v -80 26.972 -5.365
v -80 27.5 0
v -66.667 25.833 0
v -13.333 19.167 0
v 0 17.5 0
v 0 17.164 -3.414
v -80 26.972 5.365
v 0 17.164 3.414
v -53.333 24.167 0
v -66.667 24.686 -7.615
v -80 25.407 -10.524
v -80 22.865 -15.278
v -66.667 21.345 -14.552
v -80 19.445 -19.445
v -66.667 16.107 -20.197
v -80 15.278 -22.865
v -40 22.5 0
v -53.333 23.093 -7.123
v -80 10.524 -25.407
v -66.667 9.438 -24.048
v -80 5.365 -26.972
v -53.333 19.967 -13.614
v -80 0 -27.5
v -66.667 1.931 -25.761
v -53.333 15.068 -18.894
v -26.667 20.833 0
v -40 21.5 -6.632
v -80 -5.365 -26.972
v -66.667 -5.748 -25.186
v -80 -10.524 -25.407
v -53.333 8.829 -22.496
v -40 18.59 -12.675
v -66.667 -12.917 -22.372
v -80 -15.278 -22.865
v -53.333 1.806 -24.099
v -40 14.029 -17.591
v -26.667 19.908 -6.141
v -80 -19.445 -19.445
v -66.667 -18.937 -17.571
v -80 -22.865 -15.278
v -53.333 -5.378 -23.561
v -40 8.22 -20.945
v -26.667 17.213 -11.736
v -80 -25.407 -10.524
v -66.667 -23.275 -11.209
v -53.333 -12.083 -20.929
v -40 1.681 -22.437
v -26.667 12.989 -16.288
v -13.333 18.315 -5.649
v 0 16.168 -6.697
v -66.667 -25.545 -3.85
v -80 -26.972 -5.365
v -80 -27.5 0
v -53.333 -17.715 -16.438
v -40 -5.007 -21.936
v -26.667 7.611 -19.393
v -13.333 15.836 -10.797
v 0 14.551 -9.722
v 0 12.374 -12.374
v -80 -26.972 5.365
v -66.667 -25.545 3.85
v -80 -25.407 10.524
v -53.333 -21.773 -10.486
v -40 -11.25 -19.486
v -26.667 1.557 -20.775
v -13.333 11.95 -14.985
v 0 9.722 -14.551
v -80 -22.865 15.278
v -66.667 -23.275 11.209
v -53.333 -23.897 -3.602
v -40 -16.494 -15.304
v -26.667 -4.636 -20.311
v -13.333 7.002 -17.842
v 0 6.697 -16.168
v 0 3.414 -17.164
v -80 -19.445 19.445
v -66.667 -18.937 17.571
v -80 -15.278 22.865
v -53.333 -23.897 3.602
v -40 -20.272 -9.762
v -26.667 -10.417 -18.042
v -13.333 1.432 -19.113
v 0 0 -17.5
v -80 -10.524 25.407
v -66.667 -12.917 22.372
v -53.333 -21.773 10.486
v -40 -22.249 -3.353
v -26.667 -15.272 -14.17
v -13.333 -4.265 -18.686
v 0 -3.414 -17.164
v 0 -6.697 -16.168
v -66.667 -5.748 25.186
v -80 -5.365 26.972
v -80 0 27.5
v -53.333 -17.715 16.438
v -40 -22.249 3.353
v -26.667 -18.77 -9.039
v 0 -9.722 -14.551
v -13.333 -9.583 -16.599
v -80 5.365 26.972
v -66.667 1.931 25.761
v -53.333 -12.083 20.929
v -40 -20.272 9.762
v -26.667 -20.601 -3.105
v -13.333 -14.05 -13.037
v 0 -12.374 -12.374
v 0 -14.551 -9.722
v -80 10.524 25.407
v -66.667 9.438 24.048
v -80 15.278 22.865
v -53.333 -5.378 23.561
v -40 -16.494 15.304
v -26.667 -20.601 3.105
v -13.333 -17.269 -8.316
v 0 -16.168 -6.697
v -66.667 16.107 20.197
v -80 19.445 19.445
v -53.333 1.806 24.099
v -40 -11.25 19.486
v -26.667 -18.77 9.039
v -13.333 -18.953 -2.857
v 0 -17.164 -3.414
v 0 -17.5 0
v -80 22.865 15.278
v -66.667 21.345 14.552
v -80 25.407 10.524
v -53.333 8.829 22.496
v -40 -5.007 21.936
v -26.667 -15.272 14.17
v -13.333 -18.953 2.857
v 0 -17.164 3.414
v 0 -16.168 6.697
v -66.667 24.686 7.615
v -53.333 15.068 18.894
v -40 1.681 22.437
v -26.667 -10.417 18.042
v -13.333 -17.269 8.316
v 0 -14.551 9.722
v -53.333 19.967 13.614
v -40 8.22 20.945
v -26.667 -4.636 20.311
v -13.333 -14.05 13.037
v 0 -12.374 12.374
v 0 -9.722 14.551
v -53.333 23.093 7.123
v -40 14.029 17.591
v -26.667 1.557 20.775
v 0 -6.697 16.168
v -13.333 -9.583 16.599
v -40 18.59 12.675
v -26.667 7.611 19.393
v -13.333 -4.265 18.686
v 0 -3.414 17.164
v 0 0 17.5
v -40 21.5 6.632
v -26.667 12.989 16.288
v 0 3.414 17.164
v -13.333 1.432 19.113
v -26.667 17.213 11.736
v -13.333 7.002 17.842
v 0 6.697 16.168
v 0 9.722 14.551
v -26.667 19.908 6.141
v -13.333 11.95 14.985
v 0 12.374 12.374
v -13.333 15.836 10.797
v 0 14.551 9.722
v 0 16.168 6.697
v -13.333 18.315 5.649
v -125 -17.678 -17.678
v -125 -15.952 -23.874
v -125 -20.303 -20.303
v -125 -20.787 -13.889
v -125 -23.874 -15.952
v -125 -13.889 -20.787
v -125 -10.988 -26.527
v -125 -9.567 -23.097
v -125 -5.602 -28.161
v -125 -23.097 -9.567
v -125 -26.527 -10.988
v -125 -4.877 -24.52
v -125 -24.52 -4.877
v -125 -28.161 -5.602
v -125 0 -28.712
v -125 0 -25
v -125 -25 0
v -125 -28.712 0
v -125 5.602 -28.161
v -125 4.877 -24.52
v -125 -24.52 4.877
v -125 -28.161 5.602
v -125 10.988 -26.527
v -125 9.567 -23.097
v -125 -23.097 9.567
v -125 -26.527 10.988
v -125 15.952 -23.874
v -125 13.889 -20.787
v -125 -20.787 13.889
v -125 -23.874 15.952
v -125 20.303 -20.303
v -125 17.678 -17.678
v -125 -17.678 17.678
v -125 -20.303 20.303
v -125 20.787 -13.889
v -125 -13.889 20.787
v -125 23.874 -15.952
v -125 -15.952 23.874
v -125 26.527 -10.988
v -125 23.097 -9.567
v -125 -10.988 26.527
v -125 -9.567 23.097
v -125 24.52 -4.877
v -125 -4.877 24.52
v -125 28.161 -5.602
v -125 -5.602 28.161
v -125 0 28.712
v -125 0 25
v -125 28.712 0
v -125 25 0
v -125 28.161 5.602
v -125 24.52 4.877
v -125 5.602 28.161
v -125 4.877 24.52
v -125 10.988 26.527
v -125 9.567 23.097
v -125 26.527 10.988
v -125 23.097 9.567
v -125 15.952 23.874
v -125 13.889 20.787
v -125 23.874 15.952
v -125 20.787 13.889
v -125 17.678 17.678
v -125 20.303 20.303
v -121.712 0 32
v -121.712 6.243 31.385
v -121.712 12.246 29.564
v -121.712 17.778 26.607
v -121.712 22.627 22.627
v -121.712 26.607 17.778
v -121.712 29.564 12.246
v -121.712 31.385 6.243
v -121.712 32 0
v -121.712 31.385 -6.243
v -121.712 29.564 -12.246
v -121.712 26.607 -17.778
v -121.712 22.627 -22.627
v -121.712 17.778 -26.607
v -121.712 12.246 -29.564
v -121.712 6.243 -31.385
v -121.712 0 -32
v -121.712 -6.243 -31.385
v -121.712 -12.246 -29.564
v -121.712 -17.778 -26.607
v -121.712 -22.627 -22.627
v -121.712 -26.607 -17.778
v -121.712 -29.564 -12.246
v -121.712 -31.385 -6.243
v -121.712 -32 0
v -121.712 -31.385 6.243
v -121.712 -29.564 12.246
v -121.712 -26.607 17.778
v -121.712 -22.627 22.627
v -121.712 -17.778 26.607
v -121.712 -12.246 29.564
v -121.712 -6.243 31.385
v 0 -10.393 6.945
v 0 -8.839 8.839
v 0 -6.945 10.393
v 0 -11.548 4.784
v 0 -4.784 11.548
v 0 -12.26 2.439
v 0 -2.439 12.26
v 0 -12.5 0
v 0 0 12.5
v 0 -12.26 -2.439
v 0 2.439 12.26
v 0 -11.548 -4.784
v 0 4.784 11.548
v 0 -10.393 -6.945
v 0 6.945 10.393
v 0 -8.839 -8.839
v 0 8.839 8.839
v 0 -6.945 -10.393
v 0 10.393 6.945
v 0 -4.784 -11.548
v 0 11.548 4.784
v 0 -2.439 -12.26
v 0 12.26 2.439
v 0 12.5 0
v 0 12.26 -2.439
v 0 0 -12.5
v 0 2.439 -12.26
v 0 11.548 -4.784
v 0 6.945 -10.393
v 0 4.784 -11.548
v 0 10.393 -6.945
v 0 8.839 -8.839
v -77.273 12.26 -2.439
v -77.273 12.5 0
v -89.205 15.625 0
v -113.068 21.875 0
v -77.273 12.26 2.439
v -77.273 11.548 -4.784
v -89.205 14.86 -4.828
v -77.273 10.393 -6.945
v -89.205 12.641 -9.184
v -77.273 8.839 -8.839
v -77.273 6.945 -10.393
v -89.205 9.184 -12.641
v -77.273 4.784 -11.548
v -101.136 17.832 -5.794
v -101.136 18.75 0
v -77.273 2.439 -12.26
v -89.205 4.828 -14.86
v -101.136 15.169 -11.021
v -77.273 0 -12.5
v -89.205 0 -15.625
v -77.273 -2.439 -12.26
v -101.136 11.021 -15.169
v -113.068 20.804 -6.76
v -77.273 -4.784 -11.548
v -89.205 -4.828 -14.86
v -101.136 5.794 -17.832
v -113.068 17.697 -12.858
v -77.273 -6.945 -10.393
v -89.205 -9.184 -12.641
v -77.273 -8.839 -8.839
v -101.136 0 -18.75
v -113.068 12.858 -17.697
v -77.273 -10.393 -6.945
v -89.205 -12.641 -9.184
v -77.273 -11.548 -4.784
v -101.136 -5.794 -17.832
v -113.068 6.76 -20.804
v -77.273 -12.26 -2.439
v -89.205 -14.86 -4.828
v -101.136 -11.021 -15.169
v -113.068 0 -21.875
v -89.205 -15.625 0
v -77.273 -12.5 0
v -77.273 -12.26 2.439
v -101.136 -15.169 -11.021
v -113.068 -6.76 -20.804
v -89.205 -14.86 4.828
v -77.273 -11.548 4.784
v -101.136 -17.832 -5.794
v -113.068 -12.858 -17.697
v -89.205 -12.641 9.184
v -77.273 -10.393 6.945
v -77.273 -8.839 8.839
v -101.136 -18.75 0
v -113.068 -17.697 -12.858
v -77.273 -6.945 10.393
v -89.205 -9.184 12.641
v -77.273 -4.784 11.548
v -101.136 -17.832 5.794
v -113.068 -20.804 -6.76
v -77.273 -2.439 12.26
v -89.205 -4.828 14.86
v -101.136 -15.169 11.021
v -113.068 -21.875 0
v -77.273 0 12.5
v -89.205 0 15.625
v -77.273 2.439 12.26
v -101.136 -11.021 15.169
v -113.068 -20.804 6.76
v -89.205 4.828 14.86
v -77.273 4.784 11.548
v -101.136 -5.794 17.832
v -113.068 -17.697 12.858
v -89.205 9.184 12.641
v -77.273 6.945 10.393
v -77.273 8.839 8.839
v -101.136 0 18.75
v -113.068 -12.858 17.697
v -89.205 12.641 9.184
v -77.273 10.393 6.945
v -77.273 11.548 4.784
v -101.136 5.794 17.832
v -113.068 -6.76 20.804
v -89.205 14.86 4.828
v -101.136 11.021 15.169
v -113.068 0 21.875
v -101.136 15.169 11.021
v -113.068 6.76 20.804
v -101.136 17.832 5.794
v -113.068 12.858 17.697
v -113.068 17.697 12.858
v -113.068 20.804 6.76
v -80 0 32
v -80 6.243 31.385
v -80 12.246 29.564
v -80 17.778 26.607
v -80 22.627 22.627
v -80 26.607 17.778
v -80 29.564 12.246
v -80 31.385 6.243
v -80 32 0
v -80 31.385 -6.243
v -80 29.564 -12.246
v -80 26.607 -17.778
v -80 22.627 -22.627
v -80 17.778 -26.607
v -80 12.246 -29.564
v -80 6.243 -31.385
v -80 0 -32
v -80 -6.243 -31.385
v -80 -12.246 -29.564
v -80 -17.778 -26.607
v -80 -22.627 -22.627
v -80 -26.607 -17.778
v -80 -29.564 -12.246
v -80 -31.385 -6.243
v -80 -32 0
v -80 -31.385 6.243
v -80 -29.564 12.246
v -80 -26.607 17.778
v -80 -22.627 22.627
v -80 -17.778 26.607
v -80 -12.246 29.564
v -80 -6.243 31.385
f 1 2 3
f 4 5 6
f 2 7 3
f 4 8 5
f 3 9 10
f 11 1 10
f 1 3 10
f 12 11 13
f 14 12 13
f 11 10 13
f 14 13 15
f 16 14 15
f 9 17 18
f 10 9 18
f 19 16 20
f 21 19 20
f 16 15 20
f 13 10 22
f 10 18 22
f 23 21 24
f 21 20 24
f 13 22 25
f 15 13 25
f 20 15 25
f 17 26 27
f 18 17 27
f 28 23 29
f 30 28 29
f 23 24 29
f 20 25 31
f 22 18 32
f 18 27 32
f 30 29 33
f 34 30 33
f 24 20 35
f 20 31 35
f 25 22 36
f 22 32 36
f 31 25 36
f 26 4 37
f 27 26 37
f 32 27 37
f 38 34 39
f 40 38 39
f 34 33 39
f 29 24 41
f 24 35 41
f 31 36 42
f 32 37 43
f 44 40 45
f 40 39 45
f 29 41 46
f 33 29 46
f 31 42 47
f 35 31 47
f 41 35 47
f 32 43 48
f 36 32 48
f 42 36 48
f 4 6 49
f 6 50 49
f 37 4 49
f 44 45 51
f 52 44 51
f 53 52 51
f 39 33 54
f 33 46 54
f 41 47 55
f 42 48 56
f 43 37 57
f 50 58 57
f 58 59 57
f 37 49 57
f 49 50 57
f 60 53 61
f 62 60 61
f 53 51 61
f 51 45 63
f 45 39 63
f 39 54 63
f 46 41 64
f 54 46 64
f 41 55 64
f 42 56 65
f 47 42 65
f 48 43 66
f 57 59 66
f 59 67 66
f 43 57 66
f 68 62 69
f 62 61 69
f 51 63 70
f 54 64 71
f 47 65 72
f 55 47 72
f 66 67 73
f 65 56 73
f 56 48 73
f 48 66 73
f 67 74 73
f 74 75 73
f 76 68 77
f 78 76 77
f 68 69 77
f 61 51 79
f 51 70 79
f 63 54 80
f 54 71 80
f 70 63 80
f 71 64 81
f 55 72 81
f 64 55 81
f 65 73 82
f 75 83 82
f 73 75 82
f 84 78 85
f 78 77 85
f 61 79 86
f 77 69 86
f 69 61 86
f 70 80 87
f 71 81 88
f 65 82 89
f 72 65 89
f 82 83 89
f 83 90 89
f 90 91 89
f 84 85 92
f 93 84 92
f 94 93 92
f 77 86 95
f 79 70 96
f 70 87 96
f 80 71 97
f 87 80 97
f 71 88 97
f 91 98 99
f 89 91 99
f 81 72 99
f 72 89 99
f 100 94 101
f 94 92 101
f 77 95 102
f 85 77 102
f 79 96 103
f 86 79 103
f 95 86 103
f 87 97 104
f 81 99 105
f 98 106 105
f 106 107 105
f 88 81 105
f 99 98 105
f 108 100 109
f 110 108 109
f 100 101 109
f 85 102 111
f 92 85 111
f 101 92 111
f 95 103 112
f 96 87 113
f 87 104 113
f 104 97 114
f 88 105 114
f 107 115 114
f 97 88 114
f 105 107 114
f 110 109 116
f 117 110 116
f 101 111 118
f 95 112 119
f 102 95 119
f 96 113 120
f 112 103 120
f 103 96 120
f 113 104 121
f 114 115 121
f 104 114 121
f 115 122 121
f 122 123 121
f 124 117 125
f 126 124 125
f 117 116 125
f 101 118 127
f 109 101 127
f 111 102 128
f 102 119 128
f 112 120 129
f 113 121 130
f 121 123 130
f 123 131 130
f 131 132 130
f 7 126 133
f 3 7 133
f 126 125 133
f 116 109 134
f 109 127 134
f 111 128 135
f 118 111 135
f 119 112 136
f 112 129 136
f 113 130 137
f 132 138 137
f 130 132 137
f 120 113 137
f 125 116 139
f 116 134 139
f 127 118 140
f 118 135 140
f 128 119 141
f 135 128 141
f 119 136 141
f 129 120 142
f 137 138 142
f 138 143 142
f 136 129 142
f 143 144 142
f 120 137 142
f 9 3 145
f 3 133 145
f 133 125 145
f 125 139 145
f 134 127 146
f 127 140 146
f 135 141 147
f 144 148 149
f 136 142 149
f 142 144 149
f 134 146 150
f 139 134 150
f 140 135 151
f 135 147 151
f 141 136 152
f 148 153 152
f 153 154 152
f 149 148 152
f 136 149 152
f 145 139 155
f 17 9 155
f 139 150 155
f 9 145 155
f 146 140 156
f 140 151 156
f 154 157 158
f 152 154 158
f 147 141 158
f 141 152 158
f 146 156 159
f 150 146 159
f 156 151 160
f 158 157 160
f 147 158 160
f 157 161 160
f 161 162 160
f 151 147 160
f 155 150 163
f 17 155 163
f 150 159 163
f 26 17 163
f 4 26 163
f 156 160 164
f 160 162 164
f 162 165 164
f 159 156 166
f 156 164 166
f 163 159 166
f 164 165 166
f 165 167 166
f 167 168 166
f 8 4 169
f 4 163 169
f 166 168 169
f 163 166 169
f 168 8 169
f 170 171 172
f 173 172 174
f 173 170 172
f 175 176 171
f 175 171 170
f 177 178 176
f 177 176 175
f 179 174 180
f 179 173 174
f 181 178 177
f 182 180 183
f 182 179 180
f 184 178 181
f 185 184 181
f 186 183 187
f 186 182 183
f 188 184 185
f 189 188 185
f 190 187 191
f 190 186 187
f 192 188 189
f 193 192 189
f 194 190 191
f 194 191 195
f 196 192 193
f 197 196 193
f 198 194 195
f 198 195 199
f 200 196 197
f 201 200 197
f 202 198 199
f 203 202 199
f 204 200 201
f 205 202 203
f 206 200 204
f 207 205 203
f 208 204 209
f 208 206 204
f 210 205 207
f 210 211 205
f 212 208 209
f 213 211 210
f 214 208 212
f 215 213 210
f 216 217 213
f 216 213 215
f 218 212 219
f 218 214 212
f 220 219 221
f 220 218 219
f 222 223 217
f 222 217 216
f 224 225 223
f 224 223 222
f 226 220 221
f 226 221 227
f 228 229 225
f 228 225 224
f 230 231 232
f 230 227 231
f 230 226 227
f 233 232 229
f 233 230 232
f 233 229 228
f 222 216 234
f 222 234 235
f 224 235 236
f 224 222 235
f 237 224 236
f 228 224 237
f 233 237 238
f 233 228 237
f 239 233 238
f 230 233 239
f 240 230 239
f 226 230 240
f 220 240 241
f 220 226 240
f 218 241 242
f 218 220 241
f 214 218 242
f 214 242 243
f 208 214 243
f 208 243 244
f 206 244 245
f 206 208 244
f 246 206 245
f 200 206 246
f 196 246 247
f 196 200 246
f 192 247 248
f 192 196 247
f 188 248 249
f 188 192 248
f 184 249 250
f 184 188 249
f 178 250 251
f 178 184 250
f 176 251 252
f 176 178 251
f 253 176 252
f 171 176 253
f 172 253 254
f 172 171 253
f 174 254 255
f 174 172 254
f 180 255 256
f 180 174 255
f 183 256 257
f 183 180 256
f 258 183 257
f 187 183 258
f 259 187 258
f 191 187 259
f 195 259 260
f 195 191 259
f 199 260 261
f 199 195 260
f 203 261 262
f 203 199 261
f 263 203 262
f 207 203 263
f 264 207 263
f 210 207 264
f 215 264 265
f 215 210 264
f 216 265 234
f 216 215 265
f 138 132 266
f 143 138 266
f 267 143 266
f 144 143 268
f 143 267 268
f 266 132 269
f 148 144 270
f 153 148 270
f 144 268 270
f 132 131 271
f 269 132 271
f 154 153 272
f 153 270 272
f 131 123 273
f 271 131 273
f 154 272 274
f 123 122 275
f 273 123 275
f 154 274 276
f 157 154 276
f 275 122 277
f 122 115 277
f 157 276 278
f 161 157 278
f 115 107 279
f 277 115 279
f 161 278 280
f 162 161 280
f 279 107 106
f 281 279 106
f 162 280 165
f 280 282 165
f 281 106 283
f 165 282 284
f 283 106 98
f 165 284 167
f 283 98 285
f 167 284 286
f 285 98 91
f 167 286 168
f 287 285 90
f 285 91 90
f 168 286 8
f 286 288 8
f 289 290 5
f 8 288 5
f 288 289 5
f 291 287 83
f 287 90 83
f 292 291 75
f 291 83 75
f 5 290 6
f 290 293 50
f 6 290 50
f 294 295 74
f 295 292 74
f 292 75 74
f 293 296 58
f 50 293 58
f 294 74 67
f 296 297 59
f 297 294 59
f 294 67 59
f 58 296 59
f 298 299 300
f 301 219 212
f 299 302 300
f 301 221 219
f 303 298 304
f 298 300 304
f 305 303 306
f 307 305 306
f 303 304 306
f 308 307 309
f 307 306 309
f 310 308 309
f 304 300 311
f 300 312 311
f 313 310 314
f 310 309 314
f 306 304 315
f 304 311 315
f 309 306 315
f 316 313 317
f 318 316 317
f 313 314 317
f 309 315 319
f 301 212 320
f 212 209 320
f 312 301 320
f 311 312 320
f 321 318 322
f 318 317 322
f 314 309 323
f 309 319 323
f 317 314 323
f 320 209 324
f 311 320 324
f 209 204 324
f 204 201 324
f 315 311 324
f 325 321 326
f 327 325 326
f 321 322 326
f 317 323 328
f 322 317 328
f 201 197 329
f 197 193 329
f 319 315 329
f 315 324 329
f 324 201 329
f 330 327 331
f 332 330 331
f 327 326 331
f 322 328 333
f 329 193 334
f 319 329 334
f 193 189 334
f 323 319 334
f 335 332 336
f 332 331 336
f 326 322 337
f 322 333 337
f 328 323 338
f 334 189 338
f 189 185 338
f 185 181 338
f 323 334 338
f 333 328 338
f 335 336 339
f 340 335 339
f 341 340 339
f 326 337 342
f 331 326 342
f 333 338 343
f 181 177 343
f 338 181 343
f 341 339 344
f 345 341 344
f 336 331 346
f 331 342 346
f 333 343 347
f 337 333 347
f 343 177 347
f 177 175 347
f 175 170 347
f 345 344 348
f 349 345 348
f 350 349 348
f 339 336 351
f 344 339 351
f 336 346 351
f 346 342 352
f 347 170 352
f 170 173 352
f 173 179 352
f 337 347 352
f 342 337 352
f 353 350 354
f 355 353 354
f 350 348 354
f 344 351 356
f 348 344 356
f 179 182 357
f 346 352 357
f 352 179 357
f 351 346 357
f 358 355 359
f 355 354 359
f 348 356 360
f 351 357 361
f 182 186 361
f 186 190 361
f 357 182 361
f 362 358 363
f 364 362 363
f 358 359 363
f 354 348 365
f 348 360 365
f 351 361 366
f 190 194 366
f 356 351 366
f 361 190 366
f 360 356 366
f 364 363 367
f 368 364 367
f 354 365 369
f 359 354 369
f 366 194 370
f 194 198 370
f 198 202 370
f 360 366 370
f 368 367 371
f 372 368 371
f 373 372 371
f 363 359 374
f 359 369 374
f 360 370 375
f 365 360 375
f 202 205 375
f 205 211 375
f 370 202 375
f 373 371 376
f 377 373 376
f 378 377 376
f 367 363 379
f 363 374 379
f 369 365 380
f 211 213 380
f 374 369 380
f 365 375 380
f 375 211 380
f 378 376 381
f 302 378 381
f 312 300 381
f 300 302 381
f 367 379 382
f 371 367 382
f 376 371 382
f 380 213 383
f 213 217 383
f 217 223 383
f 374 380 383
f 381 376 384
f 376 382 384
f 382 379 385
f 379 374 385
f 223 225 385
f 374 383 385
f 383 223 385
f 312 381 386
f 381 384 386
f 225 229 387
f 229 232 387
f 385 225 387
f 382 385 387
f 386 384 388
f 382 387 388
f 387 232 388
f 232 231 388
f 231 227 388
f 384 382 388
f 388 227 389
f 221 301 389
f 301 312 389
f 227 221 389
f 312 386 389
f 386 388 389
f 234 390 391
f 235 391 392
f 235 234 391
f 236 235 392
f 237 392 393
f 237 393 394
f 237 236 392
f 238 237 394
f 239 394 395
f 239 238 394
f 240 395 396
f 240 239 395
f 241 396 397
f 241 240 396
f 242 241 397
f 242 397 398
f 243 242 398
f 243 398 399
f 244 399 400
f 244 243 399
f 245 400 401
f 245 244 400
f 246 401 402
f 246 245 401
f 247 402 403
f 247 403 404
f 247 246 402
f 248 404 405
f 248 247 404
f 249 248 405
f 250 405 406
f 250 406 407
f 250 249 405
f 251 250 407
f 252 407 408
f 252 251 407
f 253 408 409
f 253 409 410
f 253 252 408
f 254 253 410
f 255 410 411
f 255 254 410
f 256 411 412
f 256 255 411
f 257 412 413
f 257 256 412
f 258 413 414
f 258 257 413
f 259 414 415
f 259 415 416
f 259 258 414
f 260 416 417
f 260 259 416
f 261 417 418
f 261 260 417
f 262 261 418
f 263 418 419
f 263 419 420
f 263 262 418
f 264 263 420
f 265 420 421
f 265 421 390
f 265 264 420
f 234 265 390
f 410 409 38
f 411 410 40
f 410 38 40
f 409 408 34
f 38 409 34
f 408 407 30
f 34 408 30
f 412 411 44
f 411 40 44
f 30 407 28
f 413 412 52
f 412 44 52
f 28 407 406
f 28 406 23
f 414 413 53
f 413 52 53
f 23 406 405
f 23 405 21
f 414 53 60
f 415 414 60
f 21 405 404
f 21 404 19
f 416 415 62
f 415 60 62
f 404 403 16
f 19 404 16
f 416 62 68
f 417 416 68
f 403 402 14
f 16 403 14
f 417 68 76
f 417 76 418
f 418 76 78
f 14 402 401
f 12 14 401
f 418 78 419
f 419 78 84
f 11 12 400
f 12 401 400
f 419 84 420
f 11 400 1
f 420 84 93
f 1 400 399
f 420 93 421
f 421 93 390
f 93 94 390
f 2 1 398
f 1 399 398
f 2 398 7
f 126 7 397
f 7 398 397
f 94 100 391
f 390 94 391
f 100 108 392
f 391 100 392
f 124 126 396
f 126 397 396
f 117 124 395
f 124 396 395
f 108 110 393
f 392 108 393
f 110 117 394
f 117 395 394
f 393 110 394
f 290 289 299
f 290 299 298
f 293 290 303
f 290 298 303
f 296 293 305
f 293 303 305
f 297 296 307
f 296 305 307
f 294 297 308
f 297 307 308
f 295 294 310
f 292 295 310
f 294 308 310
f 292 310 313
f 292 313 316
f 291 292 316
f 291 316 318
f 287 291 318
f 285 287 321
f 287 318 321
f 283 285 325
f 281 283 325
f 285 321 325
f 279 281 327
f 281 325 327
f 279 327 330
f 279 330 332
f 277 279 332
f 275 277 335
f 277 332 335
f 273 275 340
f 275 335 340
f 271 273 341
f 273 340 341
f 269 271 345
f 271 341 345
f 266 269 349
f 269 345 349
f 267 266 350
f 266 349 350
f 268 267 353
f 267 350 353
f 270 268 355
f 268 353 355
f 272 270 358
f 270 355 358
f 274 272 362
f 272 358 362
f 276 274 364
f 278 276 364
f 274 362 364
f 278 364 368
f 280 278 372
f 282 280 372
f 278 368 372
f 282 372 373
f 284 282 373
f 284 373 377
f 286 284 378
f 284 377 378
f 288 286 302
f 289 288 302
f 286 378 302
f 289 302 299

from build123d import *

# Parameters (mm, degrees)
SKETCH_4_R      = 32
SKETCH_4_R_2    = 27.5
EXTRUDE_1_DEPTH = 45
CHAMFER_1_SIZE  = 3.2875


with BuildPart() as part:
    # Эскиз1 → Повернуть1 (revolve)
    with BuildSketch(Plane.XY):
        Polygon((-125, 27.5), (-80, 27.5), (0, 17.5), (0, 12.5), (-77.272727273, 12.5), (-125, 25), align=None)
    revolve(axis=Axis((0, 0, 0), (-1, 0, 0)))

    # Эскиз4 → Бобышка-Вытянуть1 (add)
    with BuildSketch(Plane.ZY.offset(125)):
        Circle(SKETCH_4_R)
        Circle(SKETCH_4_R_2, mode=Mode.SUBTRACT)
    extrude(amount=-EXTRUDE_1_DEPTH)

    # Фаска1
    chamfer_1_edges = [part.edges().sort_by_distance(p)[0] for p in [
        (-125, 0, -32),
    ]]
    chamfer(chamfer_1_edges, length=CHAMFER_1_SIZE)


solid = part.part
